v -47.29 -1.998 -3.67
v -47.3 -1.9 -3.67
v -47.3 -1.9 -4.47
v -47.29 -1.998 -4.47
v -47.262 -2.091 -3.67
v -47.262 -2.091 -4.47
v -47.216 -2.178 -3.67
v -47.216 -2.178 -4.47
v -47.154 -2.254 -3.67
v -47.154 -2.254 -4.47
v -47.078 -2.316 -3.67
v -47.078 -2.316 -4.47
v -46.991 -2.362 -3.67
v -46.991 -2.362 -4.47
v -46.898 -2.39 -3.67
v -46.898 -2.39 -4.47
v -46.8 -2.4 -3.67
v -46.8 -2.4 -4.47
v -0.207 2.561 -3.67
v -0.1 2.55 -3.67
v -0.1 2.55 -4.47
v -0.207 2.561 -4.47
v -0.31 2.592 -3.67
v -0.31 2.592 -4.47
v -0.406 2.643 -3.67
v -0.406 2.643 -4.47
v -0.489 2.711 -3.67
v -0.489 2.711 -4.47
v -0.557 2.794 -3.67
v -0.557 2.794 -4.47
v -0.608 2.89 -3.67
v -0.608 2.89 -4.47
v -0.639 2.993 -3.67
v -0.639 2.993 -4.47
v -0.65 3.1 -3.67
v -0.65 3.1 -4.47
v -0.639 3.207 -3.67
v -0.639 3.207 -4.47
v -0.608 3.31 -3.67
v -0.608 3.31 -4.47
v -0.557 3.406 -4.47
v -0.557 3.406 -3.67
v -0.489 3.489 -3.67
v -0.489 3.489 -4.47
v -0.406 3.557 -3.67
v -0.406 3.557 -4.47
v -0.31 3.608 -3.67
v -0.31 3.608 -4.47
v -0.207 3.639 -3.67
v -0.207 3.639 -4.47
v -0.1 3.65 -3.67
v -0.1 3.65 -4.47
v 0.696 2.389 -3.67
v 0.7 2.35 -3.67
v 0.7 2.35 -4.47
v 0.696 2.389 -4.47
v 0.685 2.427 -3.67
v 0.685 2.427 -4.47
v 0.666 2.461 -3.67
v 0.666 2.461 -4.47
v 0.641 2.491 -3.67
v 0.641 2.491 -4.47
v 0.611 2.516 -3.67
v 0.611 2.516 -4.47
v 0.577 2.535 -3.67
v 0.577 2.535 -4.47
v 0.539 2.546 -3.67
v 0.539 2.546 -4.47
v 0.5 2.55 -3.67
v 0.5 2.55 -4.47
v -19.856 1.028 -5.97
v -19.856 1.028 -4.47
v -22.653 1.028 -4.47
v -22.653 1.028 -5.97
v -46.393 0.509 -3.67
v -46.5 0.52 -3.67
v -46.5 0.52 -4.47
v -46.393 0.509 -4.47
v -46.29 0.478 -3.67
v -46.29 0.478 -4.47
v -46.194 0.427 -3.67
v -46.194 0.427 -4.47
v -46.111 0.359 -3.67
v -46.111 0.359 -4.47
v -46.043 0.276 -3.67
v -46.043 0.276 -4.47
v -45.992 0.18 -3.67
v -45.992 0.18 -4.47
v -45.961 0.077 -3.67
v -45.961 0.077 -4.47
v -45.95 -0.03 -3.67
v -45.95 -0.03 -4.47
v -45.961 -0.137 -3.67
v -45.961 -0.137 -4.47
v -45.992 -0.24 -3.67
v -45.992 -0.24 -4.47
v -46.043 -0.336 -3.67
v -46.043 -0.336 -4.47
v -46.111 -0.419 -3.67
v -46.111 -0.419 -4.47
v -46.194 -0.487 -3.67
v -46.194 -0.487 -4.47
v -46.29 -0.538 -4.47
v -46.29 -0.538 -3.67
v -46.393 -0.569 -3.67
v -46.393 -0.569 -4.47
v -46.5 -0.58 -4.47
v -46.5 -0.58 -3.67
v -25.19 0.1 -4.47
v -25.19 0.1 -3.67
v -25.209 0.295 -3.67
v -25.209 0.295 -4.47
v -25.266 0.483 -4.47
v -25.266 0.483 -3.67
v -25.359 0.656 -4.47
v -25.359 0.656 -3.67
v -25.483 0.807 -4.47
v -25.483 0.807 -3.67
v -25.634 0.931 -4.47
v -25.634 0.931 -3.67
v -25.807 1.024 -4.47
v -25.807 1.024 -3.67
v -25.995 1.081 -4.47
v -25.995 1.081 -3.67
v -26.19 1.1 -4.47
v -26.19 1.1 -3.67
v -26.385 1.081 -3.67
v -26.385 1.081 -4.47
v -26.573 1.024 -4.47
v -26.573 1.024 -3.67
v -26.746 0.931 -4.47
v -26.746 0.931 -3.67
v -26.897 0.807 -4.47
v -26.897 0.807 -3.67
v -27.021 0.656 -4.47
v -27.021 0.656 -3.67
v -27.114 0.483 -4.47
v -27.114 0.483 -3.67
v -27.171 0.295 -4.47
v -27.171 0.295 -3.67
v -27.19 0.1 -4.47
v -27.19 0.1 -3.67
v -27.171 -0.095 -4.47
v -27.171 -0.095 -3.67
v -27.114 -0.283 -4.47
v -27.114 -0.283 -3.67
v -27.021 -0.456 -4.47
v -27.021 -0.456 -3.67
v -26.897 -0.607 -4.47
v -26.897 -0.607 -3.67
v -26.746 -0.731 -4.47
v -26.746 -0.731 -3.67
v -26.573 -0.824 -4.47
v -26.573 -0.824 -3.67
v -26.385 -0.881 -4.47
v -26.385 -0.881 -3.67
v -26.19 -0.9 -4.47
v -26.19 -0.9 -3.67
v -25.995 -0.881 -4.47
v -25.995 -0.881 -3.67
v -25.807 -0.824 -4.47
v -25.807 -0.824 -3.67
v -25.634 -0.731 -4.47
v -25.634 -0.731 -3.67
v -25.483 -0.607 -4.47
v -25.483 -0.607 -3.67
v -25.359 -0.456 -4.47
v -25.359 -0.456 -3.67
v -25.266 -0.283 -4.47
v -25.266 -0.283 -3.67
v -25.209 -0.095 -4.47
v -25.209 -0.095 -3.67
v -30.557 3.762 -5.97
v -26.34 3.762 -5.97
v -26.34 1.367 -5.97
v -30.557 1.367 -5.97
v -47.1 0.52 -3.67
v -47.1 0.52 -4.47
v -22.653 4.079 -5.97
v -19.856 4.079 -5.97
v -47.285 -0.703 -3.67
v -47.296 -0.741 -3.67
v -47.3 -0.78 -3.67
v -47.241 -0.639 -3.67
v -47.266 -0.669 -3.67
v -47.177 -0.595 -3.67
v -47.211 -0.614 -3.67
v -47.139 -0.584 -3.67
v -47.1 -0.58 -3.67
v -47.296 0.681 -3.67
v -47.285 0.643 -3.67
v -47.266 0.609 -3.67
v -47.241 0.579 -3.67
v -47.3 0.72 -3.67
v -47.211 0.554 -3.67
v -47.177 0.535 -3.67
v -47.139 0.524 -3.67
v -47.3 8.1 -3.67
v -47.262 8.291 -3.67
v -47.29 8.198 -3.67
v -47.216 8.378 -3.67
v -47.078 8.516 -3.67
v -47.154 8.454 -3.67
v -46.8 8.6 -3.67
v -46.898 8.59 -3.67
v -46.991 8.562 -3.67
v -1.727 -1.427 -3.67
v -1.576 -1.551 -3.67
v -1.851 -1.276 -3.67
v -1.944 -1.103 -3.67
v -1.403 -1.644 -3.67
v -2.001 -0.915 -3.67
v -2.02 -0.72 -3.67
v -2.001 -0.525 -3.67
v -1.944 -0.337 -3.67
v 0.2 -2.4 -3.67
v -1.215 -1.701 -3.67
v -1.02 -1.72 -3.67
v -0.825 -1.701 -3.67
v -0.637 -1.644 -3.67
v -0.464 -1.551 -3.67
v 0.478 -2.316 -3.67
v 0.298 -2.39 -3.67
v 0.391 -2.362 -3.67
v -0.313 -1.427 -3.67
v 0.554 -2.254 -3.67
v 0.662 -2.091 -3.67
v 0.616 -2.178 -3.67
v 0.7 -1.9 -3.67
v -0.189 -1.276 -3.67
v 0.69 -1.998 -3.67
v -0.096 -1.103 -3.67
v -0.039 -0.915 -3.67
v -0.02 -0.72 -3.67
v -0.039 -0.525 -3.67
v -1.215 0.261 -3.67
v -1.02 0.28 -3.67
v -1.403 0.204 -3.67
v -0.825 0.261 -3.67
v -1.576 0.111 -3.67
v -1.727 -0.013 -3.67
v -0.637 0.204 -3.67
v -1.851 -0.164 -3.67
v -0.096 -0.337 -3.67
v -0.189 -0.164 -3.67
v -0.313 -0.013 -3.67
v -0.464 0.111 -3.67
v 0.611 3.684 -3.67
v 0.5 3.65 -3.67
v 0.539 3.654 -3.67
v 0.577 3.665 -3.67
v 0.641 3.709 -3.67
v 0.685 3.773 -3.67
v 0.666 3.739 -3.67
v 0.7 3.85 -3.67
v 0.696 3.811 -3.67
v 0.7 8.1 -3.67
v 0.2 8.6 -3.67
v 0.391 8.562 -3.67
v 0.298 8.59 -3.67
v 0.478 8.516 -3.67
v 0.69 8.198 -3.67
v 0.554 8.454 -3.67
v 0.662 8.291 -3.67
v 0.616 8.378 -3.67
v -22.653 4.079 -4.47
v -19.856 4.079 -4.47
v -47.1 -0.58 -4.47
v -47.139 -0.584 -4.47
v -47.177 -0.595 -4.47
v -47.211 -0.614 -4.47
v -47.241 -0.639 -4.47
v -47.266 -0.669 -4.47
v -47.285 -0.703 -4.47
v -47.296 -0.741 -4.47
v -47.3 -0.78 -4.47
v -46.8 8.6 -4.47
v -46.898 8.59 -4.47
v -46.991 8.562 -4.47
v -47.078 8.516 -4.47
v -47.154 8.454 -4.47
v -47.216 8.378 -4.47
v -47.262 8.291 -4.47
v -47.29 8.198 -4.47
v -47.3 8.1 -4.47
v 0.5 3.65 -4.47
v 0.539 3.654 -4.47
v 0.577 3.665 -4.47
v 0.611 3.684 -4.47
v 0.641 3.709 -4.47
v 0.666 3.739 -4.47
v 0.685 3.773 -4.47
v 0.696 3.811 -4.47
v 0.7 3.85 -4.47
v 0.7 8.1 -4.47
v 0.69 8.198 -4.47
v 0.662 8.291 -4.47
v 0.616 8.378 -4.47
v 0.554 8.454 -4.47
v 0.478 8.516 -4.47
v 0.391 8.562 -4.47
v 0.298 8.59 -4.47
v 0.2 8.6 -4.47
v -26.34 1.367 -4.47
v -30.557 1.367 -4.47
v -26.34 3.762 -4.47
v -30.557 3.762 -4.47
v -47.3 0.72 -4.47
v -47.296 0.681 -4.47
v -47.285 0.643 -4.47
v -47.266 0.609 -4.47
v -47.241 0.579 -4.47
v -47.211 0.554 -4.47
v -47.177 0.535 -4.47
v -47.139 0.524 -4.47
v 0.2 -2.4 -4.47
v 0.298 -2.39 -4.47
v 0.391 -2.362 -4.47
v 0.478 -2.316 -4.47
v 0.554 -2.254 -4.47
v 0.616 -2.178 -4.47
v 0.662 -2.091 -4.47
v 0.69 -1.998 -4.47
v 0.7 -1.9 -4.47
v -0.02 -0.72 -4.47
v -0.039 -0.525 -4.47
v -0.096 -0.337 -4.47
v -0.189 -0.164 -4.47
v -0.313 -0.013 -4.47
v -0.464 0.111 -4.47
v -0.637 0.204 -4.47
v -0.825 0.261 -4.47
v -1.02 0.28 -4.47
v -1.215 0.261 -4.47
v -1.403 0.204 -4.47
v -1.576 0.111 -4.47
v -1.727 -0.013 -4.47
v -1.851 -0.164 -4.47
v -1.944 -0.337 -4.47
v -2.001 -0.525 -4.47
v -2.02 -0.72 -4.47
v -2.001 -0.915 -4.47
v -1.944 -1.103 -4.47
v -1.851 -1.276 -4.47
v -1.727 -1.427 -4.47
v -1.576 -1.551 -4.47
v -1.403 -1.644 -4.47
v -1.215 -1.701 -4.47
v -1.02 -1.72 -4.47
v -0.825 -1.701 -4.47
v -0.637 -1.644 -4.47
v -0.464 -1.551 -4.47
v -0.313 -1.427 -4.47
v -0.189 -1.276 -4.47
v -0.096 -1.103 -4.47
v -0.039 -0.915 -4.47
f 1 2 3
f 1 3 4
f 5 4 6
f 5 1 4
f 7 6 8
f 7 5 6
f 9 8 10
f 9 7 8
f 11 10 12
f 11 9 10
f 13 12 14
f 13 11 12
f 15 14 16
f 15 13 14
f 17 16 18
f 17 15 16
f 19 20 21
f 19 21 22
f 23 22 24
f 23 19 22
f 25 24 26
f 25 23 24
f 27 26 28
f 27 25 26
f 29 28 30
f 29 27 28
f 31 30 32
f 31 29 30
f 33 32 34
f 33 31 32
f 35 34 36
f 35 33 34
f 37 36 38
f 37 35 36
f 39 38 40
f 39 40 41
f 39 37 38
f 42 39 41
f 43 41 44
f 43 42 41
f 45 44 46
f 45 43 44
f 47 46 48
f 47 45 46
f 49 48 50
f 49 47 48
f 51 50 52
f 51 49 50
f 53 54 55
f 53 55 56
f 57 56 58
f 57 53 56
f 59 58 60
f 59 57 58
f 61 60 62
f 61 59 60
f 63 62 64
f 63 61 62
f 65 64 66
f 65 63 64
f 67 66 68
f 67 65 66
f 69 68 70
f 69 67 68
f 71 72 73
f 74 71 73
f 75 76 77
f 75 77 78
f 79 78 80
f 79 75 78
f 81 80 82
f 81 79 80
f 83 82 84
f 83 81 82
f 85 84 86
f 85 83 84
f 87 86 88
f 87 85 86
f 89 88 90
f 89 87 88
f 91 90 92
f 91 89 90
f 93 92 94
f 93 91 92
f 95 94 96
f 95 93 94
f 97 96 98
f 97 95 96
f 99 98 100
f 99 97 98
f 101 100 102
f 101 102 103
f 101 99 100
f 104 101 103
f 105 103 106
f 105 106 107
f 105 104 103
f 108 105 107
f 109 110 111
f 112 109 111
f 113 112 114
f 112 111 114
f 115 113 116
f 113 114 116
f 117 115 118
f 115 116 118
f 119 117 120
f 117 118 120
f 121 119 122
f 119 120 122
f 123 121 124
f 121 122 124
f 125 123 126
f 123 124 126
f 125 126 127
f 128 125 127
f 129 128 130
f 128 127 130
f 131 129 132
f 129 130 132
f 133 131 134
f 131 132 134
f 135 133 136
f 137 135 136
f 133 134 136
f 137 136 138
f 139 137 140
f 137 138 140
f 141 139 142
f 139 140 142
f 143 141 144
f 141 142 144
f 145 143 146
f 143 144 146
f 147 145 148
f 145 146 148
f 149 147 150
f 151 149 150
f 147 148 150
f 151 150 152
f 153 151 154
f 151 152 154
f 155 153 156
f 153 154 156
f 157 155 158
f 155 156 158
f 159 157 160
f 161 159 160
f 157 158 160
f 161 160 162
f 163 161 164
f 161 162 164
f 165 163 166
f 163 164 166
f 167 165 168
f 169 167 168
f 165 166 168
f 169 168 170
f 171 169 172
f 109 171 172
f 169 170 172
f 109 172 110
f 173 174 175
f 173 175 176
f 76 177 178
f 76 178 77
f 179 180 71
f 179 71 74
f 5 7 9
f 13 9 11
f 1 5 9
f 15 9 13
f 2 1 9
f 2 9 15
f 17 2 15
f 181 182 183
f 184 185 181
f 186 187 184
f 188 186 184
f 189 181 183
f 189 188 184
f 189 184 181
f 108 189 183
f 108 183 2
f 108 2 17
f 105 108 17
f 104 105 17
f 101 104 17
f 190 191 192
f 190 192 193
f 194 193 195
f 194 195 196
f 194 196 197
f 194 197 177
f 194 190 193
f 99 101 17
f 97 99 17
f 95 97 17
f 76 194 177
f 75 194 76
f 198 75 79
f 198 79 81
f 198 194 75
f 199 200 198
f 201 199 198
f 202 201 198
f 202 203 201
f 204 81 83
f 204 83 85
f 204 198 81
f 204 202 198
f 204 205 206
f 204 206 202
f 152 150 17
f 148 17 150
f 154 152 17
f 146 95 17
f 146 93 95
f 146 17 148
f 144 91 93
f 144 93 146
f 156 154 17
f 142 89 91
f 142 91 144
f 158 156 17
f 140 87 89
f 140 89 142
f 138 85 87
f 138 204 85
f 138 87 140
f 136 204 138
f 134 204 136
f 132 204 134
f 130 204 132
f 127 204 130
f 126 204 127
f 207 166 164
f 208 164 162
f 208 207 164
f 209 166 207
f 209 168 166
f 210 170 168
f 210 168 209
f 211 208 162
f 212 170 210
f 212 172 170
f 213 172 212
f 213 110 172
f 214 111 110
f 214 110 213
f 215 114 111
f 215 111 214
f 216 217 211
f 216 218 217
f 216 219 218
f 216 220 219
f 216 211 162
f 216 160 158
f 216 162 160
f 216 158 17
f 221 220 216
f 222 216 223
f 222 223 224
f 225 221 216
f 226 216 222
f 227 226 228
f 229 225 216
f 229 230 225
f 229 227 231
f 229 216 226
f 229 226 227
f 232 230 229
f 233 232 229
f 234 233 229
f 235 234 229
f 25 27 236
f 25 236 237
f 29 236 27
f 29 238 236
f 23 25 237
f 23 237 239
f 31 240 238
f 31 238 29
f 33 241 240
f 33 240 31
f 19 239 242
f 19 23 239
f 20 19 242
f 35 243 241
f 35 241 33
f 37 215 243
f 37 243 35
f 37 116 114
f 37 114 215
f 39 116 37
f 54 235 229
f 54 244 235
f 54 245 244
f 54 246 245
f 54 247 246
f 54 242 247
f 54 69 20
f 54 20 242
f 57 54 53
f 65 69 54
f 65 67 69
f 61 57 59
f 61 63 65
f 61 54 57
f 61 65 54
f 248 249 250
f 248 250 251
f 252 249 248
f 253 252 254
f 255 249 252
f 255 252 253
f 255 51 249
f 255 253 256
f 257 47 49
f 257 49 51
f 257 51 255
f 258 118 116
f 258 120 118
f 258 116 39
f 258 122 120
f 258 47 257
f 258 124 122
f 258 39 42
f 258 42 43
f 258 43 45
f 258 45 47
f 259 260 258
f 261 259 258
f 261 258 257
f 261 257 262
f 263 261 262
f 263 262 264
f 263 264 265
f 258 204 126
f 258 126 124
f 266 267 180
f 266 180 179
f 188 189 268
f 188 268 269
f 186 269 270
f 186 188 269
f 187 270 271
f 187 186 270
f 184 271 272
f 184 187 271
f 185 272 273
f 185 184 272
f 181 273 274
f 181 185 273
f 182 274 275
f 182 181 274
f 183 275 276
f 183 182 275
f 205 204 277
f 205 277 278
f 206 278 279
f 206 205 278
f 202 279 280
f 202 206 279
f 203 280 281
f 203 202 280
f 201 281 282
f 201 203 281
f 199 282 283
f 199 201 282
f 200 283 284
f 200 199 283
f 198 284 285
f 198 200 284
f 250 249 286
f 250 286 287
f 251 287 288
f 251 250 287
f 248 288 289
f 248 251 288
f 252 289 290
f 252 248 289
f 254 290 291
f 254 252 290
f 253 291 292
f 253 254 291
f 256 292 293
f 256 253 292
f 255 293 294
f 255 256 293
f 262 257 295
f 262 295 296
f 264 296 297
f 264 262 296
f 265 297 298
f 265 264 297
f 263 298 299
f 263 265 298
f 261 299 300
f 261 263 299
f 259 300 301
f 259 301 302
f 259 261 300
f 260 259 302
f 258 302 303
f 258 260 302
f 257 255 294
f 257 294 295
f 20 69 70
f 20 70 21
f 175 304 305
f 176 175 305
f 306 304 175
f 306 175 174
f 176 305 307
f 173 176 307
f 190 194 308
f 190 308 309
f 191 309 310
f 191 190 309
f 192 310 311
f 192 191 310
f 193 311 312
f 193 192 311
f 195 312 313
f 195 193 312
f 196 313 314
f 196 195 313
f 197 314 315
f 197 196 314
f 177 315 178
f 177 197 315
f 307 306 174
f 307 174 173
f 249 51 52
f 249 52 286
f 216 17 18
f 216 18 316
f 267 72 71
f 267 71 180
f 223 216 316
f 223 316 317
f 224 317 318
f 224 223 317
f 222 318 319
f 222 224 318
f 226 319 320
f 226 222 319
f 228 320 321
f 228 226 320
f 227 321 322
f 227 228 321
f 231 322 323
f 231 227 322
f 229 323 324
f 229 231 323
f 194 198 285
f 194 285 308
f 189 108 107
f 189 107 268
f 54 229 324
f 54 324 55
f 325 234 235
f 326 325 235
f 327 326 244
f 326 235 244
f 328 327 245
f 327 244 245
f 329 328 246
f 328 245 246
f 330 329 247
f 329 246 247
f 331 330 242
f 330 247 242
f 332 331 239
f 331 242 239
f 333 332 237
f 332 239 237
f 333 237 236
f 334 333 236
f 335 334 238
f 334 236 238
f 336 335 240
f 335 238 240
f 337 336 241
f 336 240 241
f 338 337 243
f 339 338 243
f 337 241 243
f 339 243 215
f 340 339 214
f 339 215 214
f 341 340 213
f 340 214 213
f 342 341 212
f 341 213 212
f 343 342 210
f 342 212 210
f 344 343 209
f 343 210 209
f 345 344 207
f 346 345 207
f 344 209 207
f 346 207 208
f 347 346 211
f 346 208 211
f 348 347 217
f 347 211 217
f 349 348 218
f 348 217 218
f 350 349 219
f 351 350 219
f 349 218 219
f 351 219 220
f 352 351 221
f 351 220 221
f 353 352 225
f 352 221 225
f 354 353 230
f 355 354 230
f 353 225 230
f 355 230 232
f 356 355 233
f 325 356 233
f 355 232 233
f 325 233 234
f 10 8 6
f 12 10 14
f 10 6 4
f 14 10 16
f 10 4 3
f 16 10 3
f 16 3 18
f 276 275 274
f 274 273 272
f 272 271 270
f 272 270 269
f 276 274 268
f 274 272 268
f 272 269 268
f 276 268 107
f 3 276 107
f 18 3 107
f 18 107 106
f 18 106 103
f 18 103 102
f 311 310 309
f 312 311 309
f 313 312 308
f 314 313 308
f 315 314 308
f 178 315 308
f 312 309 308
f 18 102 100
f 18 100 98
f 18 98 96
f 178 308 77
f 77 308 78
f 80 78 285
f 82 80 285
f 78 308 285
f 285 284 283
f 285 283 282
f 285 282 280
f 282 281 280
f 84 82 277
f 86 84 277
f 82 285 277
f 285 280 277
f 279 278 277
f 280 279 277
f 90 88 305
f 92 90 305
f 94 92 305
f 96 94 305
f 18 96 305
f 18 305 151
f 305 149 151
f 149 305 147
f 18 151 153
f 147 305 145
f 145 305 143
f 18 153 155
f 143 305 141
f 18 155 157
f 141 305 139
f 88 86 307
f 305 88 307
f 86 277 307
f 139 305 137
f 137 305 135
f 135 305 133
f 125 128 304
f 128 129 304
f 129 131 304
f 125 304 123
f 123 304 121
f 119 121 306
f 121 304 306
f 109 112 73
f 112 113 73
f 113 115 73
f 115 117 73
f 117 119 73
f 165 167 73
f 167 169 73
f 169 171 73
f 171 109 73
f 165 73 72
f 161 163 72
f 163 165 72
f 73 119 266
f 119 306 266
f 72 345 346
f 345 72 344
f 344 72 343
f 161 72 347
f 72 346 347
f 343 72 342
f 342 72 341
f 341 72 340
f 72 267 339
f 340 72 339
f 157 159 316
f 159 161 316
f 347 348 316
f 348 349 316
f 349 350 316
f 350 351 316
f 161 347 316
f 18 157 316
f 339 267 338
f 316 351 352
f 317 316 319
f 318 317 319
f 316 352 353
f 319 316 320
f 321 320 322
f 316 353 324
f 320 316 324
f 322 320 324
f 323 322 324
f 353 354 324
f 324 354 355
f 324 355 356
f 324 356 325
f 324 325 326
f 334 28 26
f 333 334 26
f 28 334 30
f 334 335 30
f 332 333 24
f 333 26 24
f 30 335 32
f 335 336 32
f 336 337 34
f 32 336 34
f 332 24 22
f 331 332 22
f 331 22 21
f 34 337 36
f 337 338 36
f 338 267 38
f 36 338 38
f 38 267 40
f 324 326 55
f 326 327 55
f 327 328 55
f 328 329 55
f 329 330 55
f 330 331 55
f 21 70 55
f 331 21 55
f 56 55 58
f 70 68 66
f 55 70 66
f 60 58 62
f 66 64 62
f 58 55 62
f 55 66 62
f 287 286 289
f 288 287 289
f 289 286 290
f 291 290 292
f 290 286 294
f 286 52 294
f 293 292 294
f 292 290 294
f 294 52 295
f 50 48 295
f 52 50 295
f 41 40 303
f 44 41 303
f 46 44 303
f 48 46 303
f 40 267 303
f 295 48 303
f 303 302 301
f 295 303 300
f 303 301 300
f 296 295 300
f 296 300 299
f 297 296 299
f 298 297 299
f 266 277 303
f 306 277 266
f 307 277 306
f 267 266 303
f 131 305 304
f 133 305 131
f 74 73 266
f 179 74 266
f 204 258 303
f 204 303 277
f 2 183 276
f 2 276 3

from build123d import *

# Parameters (mm, degrees)
BOSS_EXTRUDE1_DEPTH = 0.8
SKETCH2_W           = 2.797017598
SKETCH2_H           = 3.051291925
SKETCH2_W_2         = 4.216715925
SKETCH2_H_2         = 2.39441658
BOSS_EXTRUDE2_DEPTH = 1.5


with BuildPart() as part:
    # Sketch1 → Boss-Extrude1 (new body)
    with BuildSketch(Plane.XY.offset(-3.67)):
        with BuildLine():
            Line((-47.1, 0.52), (-46.5, 0.52))
            ThreePointArc((-46.5, 0.52), (-45.95, -0.03), (-46.5, -0.58))
            Line((-46.5, -0.58), (-47.1, -0.58))
            ThreePointArc((-47.1, -0.58), (-47.241421356, -0.638578644), (-47.3, -0.78))
            Line((-47.3, -0.78), (-47.3, -1.9))
            ThreePointArc((-47.3, -1.9), (-47.153553391, -2.253553391), (-46.8, -2.4))
            Line((-46.8, -2.4), (0.2, -2.4))
            ThreePointArc((0.2, -2.4), (0.553553391, -2.253553391), (0.7, -1.9))
            Line((0.7, -1.9), (0.7, 2.35))
            ThreePointArc((0.7, 2.35), (0.641421356, 2.491421356), (0.5, 2.55))
            Line((0.5, 2.55), (-0.1, 2.55))
            ThreePointArc((-0.1, 2.55), (-0.65, 3.1), (-0.1, 3.65))
            Line((-0.1, 3.65), (0.5, 3.65))
            ThreePointArc((0.5, 3.65), (0.641421356, 3.708578644), (0.7, 3.85))
            Line((0.7, 3.85), (0.7, 8.1))
            ThreePointArc((0.7, 8.1), (0.553553391, 8.453553391), (0.2, 8.6))
            Line((0.2, 8.6), (-46.8, 8.6))
            ThreePointArc((-46.8, 8.6), (-47.153553391, 8.453553391), (-47.3, 8.1))
            Line((-47.3, 8.1), (-47.3, 0.72))
            ThreePointArc((-47.3, 0.72), (-47.241421356, 0.578578644), (-47.1, 0.52))
        make_face()
        with BuildLine():
            ThreePointArc((-2.02, -0.72), (-1.02, -1.72), (-0.02, -0.72))
            ThreePointArc((-0.02, -0.72), (-1.02, 0.28), (-2.02, -0.72))
        make_face(mode=Mode.SUBTRACT)
        with BuildLine():
            ThreePointArc((-27.19, 0.1), (-26.19, -0.9), (-25.19, 0.1))
            ThreePointArc((-25.19, 0.1), (-26.19, 1.1), (-27.19, 0.1))
        make_face(mode=Mode.SUBTRACT)
    extrude(amount=-BOSS_EXTRUDE1_DEPTH)

    # Sketch2 → Boss-Extrude2 (add)
    with BuildSketch(Plane(origin=(0, 0, -4.47), x_dir=(-1, 0, 0), z_dir=(0, 0, -1))):
        with Locations((21.254561383, 2.553733594)):
            Rectangle(SKETCH2_W, SKETCH2_H)
        with Locations((28.448405888, 2.564328357)):
            Rectangle(SKETCH2_W_2, SKETCH2_H_2)
    extrude(amount=BOSS_EXTRUDE2_DEPTH)


solid = part.part
